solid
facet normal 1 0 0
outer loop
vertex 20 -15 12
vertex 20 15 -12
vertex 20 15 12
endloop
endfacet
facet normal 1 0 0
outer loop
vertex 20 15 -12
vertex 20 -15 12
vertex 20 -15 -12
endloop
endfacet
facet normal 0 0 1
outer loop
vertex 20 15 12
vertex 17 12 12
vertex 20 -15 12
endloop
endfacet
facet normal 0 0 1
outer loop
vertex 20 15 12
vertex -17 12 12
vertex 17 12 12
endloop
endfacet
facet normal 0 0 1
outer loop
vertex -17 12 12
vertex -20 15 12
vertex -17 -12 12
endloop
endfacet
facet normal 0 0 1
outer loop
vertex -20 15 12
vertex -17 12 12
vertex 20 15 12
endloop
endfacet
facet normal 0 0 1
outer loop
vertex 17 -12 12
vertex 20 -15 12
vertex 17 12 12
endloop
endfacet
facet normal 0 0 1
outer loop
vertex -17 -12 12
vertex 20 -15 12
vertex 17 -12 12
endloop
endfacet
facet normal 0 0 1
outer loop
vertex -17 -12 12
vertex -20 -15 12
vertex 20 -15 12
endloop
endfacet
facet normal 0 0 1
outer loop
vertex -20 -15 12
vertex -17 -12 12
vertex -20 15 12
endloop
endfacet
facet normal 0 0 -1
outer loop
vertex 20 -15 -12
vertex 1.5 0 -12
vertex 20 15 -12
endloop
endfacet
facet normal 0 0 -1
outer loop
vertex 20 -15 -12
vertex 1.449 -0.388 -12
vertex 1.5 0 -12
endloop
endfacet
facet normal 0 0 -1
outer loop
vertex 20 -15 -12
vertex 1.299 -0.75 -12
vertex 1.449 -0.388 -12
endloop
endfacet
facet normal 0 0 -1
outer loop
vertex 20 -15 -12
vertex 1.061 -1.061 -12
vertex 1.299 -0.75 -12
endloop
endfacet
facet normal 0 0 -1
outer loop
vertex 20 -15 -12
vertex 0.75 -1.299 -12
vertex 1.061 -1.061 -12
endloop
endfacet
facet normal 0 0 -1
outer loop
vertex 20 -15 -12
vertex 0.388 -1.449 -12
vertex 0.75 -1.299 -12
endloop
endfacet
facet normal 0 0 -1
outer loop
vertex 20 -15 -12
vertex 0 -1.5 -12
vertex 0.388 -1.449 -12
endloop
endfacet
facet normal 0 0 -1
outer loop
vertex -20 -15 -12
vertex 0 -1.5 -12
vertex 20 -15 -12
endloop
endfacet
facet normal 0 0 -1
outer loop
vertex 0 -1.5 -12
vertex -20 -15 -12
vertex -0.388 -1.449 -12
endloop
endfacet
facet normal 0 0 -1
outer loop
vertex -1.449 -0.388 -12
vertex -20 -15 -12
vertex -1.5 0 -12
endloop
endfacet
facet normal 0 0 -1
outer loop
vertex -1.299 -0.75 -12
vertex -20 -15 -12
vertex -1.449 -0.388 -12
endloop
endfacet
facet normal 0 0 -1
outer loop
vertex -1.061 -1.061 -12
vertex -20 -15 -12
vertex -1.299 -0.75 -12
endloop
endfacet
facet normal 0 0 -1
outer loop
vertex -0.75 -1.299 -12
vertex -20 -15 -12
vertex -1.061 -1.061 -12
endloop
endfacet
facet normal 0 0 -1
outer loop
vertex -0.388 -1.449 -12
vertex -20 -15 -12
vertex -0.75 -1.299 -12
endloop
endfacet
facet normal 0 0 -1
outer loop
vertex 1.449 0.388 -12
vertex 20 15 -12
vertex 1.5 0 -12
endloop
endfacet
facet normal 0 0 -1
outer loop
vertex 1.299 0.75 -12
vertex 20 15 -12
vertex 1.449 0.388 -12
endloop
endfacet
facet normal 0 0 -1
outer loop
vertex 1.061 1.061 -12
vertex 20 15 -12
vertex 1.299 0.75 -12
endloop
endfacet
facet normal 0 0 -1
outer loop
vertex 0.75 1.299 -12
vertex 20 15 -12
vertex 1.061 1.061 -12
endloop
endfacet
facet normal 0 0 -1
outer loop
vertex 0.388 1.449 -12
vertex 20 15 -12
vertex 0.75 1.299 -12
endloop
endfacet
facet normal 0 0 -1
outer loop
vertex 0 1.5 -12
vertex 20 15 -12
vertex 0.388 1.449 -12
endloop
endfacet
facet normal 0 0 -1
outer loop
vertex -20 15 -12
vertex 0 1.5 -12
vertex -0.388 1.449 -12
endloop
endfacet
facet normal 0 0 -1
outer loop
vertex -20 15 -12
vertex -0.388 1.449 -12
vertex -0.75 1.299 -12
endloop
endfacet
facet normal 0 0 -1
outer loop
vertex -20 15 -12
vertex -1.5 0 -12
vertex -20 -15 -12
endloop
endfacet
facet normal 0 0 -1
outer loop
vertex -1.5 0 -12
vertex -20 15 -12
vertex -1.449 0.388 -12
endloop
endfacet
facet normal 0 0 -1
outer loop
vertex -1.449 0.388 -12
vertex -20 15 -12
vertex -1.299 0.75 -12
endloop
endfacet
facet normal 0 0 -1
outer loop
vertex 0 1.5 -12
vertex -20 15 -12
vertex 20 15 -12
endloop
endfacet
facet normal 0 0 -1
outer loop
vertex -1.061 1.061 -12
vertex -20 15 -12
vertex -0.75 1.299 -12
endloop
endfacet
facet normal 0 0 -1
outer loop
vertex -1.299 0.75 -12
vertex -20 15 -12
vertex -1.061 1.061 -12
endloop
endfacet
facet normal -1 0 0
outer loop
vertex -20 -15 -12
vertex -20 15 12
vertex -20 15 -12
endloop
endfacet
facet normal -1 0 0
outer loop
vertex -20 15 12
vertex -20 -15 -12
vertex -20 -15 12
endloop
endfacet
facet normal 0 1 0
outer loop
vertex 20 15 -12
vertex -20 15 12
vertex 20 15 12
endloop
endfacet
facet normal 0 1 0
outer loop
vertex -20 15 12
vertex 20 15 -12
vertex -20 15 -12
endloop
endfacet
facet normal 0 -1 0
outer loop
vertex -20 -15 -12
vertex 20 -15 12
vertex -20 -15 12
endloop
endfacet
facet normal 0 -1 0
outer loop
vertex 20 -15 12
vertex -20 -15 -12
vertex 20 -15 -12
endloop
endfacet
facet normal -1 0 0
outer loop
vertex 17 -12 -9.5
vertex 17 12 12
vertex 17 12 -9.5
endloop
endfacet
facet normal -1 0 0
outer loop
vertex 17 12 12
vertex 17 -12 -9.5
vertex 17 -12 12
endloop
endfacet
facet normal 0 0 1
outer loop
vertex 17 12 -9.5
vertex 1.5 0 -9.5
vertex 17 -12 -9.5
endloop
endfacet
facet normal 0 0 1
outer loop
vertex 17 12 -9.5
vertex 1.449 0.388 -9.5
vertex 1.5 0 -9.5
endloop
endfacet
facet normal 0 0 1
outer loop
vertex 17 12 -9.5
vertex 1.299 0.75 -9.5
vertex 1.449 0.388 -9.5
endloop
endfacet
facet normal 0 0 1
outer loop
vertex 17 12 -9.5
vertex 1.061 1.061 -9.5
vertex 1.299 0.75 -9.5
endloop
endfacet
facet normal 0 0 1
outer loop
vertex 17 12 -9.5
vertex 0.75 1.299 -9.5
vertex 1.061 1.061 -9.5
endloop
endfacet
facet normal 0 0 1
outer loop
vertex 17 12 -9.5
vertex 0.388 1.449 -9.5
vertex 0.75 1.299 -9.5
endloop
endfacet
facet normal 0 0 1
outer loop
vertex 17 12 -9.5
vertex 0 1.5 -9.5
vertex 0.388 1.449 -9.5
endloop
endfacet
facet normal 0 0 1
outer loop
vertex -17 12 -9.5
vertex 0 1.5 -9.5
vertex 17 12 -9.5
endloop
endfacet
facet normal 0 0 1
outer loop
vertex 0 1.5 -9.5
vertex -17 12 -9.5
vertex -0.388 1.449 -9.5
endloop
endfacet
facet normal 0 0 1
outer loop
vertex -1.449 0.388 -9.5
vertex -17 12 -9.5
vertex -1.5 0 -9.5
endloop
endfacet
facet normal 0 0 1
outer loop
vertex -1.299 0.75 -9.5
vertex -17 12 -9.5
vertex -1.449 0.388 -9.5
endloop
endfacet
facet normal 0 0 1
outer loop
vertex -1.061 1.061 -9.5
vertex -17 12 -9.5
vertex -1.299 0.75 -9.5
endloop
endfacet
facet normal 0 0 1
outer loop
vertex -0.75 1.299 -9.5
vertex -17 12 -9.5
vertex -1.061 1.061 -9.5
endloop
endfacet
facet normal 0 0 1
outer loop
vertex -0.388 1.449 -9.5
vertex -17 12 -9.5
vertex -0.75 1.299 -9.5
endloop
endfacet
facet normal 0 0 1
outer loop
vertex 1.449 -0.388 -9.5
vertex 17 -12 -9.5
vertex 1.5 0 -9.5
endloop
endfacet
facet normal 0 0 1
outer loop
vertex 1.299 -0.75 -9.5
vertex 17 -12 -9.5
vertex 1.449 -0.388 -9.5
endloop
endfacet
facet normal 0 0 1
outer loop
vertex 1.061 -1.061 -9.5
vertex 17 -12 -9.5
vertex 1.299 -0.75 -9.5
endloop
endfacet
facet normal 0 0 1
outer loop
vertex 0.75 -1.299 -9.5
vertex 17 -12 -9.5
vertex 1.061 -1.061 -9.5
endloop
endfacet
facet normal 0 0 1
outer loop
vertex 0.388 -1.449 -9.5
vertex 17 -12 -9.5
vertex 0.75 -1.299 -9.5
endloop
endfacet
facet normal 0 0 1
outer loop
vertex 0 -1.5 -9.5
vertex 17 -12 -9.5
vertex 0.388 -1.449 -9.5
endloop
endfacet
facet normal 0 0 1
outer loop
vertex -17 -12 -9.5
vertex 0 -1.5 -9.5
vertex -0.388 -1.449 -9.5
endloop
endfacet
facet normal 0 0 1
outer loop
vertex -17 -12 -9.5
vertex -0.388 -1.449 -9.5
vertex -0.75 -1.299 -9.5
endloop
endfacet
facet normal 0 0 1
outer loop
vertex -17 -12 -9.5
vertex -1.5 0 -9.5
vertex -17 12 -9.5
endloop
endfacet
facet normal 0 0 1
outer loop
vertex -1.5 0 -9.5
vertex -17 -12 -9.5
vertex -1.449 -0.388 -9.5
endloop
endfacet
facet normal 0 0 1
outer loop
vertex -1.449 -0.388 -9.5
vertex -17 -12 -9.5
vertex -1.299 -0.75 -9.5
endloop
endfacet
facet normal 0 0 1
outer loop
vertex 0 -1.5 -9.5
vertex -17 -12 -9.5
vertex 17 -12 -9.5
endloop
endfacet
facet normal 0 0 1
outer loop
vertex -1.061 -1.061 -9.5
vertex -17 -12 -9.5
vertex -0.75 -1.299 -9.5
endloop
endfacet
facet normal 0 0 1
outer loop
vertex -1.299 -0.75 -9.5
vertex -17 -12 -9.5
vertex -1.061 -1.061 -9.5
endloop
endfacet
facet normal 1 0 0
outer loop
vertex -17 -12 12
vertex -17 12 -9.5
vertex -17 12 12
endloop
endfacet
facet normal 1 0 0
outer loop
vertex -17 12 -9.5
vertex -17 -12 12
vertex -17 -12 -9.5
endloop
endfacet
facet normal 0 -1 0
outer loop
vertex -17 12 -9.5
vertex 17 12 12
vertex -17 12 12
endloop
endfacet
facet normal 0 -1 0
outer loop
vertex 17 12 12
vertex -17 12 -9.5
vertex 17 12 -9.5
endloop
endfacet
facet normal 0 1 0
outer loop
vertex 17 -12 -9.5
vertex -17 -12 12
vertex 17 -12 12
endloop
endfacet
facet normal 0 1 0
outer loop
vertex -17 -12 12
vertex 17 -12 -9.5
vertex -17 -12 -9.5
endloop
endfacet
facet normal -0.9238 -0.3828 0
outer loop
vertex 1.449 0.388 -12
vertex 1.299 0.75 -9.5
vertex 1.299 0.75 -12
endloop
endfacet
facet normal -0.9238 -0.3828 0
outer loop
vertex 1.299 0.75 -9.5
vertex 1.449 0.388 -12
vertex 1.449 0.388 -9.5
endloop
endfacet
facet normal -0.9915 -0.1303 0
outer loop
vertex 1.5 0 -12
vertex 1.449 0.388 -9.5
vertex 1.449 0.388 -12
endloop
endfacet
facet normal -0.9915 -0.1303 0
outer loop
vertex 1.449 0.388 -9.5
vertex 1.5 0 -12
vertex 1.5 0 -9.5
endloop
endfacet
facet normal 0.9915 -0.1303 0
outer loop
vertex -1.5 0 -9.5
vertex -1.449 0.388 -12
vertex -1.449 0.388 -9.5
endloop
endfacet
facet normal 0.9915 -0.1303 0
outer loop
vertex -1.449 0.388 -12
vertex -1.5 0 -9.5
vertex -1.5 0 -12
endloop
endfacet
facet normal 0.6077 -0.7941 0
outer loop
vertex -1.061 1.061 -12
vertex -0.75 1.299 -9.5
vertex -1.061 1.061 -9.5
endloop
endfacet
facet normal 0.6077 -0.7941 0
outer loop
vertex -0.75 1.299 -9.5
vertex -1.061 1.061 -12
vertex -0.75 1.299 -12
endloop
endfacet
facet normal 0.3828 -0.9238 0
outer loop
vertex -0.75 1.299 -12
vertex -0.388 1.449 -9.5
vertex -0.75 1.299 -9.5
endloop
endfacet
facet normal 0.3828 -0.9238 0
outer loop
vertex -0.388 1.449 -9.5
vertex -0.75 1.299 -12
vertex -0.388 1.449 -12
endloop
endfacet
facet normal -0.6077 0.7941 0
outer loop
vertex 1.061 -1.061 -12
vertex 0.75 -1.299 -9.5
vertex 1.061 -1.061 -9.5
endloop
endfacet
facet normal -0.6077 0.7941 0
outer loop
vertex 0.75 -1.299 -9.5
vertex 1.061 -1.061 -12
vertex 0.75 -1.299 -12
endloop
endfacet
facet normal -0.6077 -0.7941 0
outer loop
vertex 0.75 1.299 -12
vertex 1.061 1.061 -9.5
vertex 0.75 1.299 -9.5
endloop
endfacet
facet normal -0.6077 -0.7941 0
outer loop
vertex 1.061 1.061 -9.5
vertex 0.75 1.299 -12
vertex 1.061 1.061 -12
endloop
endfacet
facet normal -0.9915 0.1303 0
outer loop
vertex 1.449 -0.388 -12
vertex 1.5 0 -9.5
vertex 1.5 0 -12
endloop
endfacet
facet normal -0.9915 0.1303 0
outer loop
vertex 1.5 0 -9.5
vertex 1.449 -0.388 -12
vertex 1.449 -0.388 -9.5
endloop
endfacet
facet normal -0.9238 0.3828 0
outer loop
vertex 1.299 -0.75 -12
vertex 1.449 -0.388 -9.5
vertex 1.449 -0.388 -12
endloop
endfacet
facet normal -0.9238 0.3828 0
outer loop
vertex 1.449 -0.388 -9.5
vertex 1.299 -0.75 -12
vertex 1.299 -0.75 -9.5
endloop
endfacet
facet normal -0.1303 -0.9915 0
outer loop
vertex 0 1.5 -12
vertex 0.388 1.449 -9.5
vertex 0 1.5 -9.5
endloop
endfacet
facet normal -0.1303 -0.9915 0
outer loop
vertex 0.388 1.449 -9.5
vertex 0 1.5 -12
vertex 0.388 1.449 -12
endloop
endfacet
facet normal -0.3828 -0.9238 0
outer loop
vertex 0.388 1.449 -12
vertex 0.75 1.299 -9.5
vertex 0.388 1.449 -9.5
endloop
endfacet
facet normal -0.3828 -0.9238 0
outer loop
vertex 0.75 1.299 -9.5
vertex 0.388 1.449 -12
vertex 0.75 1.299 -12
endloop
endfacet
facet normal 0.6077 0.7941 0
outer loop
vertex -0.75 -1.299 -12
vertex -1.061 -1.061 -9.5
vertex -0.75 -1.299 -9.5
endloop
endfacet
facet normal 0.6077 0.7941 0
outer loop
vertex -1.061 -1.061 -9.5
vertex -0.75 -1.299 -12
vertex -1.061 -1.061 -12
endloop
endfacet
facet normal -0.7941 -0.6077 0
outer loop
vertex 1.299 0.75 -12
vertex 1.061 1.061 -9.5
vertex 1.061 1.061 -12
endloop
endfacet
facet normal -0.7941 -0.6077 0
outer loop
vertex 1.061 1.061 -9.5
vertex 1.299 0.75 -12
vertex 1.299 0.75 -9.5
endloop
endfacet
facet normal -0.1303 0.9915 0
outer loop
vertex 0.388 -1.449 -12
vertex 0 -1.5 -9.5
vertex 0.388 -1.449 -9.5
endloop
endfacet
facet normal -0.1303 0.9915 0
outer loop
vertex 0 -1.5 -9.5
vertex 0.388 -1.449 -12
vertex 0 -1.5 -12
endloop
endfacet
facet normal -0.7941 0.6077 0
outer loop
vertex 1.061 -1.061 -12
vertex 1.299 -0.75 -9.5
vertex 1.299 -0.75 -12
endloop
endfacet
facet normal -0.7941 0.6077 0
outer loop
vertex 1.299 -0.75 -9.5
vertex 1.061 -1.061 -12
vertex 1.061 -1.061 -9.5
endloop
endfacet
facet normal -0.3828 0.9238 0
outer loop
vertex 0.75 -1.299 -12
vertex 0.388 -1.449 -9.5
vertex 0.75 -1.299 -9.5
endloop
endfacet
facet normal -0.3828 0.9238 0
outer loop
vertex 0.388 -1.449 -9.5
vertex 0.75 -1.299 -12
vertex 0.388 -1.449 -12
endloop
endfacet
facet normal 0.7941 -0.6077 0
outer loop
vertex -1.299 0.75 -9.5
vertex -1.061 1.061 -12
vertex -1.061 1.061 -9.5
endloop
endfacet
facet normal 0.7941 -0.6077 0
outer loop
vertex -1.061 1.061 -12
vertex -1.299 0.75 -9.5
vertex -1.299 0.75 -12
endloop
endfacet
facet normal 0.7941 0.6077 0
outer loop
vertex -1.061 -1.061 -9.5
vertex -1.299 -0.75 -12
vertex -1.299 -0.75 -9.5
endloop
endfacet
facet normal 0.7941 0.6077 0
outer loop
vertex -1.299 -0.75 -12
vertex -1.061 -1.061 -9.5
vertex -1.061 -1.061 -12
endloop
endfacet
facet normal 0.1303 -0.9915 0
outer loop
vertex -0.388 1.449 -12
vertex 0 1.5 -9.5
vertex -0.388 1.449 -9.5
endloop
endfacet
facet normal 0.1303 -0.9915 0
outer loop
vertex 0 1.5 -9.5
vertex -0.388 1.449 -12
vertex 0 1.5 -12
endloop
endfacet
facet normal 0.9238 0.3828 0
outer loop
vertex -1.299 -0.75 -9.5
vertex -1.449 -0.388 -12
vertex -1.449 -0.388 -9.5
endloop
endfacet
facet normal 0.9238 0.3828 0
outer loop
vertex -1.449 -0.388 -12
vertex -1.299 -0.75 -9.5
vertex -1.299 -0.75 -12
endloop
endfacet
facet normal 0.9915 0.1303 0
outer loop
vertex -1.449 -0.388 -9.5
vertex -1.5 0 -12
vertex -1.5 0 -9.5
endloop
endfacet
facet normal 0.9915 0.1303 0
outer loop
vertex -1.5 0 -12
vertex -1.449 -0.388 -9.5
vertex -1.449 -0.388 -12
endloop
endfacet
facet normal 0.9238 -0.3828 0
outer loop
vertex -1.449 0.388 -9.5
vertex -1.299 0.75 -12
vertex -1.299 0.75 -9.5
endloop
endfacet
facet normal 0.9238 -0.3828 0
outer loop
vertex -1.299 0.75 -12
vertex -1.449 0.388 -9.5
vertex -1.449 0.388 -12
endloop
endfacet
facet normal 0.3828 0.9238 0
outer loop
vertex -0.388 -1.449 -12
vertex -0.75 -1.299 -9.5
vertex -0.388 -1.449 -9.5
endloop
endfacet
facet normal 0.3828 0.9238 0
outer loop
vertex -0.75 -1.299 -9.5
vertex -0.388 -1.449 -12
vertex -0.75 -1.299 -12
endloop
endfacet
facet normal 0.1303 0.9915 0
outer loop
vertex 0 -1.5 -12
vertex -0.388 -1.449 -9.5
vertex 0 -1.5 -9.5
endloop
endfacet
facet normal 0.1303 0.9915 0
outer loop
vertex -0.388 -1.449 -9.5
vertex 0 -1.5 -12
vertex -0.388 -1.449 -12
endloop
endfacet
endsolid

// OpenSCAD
outer_x=40;outer_y=30;outer_z=24;wall=3;base=3;
difference(){
  cube([outer_x,outer_y,outer_z],center=true);
  translate([0,0,base/2])cube([outer_x-2*wall,outer_y-2*wall,outer_z-base+1],center=true);
  cylinder(h=outer_z+2,r=1.5,center=true,$fn=24);
}
